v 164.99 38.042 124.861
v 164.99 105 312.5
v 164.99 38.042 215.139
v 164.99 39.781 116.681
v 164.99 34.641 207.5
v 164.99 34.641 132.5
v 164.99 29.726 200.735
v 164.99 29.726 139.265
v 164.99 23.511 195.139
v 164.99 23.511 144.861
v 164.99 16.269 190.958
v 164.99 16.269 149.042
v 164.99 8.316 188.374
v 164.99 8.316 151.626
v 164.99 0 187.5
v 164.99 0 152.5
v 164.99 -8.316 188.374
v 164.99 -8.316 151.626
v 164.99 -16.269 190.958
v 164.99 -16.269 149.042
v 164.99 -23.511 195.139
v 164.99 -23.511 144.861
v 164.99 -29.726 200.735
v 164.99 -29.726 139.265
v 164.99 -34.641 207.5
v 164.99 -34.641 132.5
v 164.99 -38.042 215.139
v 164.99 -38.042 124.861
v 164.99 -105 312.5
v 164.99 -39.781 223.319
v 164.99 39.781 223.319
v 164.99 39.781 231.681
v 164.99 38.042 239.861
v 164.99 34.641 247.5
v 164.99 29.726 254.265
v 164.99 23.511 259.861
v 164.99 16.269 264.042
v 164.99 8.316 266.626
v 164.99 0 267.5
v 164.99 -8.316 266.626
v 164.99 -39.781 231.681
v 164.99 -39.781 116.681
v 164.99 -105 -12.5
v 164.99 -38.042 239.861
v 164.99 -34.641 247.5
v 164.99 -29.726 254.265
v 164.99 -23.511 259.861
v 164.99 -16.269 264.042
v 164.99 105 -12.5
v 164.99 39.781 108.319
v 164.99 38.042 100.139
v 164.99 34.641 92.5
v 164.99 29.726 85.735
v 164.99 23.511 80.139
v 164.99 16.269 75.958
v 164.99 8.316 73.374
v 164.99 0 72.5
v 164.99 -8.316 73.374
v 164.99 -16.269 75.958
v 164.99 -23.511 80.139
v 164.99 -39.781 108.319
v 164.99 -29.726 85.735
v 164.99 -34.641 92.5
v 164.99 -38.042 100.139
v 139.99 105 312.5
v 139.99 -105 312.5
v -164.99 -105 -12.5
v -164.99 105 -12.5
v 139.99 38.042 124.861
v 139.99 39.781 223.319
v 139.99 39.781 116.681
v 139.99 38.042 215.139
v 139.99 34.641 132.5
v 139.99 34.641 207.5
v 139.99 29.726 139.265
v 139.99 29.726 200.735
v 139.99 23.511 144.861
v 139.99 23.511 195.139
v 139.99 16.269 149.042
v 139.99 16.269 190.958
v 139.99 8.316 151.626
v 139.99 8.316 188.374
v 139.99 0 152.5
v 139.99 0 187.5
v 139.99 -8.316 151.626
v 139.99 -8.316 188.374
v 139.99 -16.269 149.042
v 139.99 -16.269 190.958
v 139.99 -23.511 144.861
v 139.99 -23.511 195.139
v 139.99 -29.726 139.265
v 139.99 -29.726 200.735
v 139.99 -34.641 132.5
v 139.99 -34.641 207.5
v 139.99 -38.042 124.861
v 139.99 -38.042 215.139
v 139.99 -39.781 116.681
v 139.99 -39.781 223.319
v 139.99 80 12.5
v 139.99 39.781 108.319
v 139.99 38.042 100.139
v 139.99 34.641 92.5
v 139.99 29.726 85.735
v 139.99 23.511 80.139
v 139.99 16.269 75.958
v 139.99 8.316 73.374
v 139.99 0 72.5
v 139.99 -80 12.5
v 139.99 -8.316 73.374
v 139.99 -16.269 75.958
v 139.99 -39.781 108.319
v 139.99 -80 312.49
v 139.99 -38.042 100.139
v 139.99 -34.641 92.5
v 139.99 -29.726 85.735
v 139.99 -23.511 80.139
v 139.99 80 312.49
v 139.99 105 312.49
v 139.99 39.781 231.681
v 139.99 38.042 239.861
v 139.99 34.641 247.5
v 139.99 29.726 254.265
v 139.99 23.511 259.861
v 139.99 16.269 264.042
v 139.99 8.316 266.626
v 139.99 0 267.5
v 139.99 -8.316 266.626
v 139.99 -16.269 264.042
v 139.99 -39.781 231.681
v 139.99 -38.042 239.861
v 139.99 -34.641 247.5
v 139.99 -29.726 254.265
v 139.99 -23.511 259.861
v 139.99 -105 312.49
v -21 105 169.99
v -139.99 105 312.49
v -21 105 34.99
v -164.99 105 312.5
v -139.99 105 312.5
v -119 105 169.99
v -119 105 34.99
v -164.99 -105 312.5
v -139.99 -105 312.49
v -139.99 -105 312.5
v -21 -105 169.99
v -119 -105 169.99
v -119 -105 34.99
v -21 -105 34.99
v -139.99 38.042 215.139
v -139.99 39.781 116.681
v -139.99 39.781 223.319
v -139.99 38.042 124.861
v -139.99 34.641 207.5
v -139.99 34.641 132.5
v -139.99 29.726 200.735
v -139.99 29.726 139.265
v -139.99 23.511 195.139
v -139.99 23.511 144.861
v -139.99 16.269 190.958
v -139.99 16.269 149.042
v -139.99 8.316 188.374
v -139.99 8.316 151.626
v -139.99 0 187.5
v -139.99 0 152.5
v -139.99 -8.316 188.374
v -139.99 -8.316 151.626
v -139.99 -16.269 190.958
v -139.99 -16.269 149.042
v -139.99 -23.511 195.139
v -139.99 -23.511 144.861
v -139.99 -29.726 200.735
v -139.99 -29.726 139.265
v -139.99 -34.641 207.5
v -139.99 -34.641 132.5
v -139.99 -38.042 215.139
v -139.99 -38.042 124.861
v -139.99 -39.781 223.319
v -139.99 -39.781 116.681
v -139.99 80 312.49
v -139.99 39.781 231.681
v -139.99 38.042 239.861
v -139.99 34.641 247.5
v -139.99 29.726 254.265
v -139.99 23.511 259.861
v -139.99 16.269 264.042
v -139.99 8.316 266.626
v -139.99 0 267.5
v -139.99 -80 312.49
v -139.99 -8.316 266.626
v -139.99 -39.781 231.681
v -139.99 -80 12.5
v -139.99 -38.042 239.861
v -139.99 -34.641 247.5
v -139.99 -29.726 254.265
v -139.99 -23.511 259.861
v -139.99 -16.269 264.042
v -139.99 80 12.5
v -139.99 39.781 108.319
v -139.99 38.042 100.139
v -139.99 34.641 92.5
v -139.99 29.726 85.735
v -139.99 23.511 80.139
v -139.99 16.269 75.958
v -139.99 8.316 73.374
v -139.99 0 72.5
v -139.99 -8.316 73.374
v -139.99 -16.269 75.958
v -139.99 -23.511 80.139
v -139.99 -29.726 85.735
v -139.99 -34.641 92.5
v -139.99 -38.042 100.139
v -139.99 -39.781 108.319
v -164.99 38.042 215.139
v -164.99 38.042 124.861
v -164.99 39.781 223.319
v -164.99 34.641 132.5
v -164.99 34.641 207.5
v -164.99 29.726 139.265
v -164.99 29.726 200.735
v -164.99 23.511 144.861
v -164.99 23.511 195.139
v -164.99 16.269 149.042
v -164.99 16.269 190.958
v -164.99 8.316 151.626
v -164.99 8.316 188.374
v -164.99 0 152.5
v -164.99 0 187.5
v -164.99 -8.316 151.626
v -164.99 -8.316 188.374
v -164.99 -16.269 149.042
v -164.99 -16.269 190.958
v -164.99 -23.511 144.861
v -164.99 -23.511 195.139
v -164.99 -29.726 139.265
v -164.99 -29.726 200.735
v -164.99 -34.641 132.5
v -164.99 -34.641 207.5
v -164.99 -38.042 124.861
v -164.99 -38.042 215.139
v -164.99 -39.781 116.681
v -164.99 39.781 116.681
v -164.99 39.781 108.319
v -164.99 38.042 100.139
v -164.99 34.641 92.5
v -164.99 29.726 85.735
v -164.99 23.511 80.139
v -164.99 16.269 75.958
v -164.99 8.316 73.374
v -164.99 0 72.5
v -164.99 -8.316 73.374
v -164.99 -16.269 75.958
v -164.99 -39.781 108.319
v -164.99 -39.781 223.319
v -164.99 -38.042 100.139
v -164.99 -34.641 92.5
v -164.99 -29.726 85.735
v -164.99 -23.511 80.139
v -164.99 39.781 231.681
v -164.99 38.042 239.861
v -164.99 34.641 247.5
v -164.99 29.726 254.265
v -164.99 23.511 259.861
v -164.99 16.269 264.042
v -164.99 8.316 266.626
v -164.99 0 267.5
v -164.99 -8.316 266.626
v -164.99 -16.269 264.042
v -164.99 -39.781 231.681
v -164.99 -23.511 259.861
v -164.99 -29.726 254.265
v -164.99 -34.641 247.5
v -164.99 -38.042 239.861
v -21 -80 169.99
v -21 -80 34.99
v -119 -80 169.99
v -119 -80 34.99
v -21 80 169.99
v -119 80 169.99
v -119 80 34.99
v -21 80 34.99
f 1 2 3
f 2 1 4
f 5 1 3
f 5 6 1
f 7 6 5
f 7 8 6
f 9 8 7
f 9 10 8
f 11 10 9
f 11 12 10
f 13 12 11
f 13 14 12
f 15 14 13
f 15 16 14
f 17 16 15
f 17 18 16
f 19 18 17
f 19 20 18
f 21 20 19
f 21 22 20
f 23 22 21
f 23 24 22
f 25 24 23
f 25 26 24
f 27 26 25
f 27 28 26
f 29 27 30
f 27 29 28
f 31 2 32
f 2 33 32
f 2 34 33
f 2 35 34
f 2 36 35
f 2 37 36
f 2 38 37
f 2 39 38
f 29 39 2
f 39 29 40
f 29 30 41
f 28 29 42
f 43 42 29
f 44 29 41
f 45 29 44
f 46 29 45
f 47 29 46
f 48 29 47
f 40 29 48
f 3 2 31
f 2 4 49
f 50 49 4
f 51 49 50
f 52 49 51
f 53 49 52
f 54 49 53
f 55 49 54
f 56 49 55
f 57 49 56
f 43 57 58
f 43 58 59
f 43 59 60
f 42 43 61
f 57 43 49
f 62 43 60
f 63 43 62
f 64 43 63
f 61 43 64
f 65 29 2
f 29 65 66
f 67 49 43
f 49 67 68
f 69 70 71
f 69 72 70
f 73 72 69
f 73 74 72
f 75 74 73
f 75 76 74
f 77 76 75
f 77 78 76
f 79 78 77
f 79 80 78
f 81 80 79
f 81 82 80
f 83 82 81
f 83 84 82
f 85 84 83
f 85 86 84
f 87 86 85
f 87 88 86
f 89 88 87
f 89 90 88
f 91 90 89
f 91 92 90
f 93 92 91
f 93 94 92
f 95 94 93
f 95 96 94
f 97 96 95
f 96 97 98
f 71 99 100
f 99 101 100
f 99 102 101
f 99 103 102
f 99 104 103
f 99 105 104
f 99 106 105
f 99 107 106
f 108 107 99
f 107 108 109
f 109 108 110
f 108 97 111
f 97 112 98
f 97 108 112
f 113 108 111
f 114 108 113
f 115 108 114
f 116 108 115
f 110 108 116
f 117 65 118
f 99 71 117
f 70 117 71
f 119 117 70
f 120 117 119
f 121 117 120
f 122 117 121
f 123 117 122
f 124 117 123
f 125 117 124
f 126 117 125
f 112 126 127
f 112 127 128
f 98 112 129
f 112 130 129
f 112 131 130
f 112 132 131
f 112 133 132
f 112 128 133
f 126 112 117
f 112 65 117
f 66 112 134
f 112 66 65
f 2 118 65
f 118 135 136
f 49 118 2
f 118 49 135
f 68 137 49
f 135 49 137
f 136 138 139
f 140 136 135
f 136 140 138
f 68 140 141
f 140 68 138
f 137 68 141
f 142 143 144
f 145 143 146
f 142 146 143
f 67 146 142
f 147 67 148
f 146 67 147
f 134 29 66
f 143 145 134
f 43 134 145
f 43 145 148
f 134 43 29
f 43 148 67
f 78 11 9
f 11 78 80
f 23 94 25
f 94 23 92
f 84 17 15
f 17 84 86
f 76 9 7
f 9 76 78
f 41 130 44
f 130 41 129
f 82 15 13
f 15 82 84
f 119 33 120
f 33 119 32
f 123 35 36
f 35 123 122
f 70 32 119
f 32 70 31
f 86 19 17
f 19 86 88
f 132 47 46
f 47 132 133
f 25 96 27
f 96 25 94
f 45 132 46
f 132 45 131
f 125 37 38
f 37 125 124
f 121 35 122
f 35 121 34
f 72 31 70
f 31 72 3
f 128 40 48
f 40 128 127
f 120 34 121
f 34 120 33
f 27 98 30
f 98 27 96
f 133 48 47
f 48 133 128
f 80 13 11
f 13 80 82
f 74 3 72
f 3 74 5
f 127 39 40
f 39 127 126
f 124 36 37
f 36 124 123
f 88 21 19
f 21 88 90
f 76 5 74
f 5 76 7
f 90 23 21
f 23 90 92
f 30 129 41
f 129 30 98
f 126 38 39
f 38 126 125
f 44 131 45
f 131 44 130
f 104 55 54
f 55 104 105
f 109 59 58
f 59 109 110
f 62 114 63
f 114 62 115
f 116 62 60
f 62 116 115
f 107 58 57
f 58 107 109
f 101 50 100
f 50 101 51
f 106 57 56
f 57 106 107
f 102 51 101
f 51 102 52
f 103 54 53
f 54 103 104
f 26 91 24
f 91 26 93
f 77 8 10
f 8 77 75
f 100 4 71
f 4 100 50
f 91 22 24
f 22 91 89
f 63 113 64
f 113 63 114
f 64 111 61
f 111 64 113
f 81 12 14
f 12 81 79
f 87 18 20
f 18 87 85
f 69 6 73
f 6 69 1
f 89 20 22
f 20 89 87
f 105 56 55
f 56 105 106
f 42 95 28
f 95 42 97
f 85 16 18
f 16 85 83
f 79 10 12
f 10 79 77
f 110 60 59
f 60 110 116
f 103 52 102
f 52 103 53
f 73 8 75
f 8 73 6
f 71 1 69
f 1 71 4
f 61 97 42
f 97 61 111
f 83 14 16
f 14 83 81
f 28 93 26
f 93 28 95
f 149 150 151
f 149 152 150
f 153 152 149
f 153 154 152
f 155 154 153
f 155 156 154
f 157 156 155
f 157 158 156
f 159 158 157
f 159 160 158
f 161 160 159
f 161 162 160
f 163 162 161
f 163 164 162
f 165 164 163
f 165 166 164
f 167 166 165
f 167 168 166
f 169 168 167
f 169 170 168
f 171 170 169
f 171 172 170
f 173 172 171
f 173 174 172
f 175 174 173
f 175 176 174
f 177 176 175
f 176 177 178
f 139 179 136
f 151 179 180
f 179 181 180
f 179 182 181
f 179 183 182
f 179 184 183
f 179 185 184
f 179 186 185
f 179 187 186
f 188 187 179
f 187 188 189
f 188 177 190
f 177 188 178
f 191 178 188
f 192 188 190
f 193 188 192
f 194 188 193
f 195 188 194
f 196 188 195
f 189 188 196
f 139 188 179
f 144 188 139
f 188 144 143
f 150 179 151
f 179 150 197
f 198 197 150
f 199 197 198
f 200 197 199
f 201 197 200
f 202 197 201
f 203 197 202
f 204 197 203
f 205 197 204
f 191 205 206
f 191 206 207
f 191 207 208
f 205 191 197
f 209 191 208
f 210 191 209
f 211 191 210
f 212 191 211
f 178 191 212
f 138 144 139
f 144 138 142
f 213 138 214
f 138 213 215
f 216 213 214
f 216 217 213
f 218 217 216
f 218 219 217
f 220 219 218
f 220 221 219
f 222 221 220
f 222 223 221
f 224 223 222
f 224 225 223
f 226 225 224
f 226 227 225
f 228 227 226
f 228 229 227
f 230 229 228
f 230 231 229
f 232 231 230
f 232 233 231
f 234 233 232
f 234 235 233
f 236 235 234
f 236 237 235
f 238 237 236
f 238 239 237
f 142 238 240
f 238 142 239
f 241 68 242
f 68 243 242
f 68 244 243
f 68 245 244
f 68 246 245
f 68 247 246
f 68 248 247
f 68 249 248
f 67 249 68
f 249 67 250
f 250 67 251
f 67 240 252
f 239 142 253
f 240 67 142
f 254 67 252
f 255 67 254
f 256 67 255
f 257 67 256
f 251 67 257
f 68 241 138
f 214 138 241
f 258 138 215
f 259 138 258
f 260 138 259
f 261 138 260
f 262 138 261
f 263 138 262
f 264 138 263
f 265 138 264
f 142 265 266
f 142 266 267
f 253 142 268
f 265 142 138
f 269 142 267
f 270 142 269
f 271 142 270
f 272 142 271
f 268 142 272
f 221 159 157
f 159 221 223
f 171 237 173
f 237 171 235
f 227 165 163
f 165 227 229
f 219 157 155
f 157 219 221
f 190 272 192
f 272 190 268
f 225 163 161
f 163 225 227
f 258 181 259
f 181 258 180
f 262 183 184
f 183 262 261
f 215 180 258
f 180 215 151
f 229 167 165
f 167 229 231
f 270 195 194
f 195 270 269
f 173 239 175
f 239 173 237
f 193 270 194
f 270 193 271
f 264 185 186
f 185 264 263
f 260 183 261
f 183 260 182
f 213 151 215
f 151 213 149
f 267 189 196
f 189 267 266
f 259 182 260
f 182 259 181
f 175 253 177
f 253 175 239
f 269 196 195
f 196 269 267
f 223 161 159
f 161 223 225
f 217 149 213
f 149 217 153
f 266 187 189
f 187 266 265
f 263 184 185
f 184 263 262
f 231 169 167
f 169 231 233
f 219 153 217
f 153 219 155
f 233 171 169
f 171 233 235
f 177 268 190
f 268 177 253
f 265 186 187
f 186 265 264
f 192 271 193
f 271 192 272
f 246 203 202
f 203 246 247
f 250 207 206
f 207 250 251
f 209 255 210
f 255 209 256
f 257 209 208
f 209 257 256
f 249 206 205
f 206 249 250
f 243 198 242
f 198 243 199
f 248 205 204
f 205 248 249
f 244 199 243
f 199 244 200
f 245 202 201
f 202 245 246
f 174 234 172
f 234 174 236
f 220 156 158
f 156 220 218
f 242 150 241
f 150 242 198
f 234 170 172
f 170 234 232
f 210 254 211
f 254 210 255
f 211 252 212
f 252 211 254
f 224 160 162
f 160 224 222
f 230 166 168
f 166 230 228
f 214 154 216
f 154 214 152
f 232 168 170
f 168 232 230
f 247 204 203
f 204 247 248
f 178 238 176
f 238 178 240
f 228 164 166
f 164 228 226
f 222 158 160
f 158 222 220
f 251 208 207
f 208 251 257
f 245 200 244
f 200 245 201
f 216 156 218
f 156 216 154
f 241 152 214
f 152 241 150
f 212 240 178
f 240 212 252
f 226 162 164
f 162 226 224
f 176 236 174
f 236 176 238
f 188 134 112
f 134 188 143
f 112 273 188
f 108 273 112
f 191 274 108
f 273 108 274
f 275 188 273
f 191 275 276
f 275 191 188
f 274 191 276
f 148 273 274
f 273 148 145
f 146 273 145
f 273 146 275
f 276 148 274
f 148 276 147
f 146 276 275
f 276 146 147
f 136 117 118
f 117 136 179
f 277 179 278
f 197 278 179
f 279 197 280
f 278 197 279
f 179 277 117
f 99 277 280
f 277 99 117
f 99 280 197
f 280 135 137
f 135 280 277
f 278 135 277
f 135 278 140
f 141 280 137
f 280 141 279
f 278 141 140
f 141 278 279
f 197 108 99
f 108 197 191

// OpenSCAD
// Idealized model of SM-465 transmission
// Worcester Polytechnic Institute
// RBE-550 Motion Planning
// Daniel Montrallo Flickinger, PhD
//
// Produce a projected view of the case end,
// to generate dimensions, for the 'transmission' assignment



use <transmission.scad>

// produce a projection of the primary shaft:
rotate([0,0,0]) case();
